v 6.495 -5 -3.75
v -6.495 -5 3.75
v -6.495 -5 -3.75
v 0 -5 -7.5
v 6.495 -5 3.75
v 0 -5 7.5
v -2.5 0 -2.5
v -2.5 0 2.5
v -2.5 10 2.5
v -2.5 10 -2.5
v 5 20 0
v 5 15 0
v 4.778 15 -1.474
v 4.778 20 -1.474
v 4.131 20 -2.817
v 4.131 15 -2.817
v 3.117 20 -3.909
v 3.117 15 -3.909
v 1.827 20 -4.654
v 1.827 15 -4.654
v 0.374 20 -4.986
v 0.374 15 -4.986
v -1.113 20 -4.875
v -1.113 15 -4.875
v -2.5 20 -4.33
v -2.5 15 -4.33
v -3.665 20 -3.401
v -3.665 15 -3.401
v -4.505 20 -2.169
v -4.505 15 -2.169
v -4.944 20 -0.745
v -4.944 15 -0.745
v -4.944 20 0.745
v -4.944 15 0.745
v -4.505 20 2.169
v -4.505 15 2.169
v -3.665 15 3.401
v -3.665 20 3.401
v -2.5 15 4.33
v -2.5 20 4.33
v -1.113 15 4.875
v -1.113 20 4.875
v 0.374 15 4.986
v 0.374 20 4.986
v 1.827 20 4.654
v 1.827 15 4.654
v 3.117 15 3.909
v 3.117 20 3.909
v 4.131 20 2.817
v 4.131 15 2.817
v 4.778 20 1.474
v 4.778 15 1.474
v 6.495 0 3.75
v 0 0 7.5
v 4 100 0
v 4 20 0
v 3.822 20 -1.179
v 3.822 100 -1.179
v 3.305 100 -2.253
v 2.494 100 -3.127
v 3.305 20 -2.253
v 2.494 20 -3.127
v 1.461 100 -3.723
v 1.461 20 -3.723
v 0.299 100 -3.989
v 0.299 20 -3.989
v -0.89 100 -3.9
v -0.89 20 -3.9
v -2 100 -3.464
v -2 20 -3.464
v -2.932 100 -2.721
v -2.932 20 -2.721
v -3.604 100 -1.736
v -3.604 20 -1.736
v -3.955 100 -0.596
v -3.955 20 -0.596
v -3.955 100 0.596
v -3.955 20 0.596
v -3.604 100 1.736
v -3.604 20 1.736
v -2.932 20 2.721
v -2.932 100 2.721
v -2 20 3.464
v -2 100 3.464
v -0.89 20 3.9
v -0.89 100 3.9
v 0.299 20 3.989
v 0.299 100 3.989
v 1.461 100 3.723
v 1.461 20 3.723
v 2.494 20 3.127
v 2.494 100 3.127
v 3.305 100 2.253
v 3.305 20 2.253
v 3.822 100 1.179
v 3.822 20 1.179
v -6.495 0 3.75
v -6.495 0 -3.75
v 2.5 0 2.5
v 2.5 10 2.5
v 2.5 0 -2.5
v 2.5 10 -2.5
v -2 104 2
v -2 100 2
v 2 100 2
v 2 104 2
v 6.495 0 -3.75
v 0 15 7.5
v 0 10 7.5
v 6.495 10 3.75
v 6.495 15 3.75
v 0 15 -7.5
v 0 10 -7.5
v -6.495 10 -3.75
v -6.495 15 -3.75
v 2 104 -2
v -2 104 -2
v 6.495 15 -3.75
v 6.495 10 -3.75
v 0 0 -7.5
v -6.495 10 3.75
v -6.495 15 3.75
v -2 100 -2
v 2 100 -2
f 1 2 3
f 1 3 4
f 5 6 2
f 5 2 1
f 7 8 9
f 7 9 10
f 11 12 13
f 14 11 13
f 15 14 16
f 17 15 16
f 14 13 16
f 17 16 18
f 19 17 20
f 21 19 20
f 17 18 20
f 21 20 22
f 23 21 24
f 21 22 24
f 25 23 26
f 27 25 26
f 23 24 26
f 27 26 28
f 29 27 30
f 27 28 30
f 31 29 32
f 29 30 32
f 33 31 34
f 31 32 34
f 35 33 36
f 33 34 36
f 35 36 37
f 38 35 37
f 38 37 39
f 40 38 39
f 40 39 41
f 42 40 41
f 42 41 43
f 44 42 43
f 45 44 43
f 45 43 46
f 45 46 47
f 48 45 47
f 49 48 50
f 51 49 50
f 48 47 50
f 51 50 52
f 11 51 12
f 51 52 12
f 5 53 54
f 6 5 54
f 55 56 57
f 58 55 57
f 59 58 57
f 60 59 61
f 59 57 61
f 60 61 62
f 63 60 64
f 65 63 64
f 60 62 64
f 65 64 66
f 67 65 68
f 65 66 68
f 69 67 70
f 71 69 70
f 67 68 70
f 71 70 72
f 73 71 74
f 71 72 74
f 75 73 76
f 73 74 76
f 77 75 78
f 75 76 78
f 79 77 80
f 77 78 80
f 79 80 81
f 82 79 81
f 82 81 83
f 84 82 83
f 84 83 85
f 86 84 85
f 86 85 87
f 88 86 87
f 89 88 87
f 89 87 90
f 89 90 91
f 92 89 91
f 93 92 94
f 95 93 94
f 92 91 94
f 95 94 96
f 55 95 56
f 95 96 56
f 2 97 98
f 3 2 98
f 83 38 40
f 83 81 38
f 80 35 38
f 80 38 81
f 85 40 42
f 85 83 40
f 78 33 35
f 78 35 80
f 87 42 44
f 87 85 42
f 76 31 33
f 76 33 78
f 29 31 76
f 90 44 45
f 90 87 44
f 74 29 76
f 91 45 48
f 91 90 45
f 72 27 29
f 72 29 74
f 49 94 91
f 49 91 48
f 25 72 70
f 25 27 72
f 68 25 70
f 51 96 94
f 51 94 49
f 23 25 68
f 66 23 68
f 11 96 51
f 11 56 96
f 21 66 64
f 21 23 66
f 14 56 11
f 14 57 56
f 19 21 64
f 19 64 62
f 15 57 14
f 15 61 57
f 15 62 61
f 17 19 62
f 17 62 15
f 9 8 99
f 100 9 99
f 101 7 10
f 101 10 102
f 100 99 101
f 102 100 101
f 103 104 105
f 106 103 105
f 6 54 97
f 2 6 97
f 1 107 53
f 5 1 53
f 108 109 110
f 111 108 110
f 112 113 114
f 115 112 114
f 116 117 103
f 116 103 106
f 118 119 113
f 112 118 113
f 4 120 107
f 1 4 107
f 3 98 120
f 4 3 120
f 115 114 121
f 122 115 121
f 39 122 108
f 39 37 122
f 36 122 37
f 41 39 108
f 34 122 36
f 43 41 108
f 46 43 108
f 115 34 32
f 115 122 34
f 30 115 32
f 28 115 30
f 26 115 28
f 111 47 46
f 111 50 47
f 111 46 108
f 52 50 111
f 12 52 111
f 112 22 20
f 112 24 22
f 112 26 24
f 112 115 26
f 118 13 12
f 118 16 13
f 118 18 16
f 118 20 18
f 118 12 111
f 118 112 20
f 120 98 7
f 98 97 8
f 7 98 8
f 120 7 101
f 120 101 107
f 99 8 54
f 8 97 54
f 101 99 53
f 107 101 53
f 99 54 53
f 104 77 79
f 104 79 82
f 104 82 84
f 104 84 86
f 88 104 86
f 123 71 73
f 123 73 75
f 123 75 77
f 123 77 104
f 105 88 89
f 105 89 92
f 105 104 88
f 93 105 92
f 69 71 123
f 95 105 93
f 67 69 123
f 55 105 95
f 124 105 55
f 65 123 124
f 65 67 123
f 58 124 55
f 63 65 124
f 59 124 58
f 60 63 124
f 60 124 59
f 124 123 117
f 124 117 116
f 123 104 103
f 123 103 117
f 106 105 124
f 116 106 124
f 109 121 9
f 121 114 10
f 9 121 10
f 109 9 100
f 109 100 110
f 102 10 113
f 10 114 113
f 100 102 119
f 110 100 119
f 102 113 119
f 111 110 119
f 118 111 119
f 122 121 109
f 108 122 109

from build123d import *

# Parameters (mm, degrees)
SKETCH1_W           = 5
SKETCH1_H           = 5
BOSS_EXTRUDE1_DEPTH = 10
BOSS_EXTRUDE2_DEPTH = 5
BOSS_EXTRUDE3_DEPTH = 5
SKETCH4_R           = 5
BOSS_EXTRUDE4_DEPTH = 5
SKETCH5_R           = 4
BOSS_EXTRUDE5_DEPTH = 80
SKETCH6_W           = 4
SKETCH6_H           = 4
BOSS_EXTRUDE6_DEPTH = 4


with BuildPart() as part:
    # Sketch1 → Boss-Extrude1 (new body)
    with BuildSketch(Plane(origin=(0, 0, 0), x_dir=(1, 0, 0), z_dir=(0, 1, 0))):
        Rectangle(SKETCH1_W, SKETCH1_H)
    extrude(amount=BOSS_EXTRUDE1_DEPTH)

    # Sketch2 → Boss-Extrude2 (add)
    with BuildSketch(Plane.XZ):
        Polygon((0, 7.5), (-6.495190528, 3.75), (-6.495190528, -3.75), (0, -7.5), (6.495190528, -3.75), (6.495190528, 3.75), align=None)
    extrude(amount=BOSS_EXTRUDE2_DEPTH)

    # Sketch3 → Boss-Extrude3 (add)
    with BuildSketch(Plane(origin=(0, 10, 0), x_dir=(1, 0, 0), z_dir=(0, 1, 0))):
        Polygon((0, -7.5), (6.495190528, -3.75), (6.495190528, 3.75), (0, 7.5), (-6.495190528, 3.75), (-6.495190528, -3.75), align=None)
    extrude(amount=BOSS_EXTRUDE3_DEPTH)

    # Sketch4 → Boss-Extrude4 (add)
    with BuildSketch(Plane(origin=(0, 15, 0), x_dir=(1, 0, 0), z_dir=(0, 1, 0))):
        Circle(SKETCH4_R)
    extrude(amount=BOSS_EXTRUDE4_DEPTH)

    # Sketch5 → Boss-Extrude5 (add)
    with BuildSketch(Plane(origin=(0, 20, 0), x_dir=(1, 0, 0), z_dir=(0, 1, 0))):
        Circle(SKETCH5_R)
    extrude(amount=BOSS_EXTRUDE5_DEPTH)

    # Sketch6 → Boss-Extrude6 (add)
    with BuildSketch(Plane(origin=(0, 100, 0), x_dir=(1, 0, 0), z_dir=(0, 1, 0))):
        Rectangle(SKETCH6_W, SKETCH6_H)
    extrude(amount=BOSS_EXTRUDE6_DEPTH)


solid = part.part
